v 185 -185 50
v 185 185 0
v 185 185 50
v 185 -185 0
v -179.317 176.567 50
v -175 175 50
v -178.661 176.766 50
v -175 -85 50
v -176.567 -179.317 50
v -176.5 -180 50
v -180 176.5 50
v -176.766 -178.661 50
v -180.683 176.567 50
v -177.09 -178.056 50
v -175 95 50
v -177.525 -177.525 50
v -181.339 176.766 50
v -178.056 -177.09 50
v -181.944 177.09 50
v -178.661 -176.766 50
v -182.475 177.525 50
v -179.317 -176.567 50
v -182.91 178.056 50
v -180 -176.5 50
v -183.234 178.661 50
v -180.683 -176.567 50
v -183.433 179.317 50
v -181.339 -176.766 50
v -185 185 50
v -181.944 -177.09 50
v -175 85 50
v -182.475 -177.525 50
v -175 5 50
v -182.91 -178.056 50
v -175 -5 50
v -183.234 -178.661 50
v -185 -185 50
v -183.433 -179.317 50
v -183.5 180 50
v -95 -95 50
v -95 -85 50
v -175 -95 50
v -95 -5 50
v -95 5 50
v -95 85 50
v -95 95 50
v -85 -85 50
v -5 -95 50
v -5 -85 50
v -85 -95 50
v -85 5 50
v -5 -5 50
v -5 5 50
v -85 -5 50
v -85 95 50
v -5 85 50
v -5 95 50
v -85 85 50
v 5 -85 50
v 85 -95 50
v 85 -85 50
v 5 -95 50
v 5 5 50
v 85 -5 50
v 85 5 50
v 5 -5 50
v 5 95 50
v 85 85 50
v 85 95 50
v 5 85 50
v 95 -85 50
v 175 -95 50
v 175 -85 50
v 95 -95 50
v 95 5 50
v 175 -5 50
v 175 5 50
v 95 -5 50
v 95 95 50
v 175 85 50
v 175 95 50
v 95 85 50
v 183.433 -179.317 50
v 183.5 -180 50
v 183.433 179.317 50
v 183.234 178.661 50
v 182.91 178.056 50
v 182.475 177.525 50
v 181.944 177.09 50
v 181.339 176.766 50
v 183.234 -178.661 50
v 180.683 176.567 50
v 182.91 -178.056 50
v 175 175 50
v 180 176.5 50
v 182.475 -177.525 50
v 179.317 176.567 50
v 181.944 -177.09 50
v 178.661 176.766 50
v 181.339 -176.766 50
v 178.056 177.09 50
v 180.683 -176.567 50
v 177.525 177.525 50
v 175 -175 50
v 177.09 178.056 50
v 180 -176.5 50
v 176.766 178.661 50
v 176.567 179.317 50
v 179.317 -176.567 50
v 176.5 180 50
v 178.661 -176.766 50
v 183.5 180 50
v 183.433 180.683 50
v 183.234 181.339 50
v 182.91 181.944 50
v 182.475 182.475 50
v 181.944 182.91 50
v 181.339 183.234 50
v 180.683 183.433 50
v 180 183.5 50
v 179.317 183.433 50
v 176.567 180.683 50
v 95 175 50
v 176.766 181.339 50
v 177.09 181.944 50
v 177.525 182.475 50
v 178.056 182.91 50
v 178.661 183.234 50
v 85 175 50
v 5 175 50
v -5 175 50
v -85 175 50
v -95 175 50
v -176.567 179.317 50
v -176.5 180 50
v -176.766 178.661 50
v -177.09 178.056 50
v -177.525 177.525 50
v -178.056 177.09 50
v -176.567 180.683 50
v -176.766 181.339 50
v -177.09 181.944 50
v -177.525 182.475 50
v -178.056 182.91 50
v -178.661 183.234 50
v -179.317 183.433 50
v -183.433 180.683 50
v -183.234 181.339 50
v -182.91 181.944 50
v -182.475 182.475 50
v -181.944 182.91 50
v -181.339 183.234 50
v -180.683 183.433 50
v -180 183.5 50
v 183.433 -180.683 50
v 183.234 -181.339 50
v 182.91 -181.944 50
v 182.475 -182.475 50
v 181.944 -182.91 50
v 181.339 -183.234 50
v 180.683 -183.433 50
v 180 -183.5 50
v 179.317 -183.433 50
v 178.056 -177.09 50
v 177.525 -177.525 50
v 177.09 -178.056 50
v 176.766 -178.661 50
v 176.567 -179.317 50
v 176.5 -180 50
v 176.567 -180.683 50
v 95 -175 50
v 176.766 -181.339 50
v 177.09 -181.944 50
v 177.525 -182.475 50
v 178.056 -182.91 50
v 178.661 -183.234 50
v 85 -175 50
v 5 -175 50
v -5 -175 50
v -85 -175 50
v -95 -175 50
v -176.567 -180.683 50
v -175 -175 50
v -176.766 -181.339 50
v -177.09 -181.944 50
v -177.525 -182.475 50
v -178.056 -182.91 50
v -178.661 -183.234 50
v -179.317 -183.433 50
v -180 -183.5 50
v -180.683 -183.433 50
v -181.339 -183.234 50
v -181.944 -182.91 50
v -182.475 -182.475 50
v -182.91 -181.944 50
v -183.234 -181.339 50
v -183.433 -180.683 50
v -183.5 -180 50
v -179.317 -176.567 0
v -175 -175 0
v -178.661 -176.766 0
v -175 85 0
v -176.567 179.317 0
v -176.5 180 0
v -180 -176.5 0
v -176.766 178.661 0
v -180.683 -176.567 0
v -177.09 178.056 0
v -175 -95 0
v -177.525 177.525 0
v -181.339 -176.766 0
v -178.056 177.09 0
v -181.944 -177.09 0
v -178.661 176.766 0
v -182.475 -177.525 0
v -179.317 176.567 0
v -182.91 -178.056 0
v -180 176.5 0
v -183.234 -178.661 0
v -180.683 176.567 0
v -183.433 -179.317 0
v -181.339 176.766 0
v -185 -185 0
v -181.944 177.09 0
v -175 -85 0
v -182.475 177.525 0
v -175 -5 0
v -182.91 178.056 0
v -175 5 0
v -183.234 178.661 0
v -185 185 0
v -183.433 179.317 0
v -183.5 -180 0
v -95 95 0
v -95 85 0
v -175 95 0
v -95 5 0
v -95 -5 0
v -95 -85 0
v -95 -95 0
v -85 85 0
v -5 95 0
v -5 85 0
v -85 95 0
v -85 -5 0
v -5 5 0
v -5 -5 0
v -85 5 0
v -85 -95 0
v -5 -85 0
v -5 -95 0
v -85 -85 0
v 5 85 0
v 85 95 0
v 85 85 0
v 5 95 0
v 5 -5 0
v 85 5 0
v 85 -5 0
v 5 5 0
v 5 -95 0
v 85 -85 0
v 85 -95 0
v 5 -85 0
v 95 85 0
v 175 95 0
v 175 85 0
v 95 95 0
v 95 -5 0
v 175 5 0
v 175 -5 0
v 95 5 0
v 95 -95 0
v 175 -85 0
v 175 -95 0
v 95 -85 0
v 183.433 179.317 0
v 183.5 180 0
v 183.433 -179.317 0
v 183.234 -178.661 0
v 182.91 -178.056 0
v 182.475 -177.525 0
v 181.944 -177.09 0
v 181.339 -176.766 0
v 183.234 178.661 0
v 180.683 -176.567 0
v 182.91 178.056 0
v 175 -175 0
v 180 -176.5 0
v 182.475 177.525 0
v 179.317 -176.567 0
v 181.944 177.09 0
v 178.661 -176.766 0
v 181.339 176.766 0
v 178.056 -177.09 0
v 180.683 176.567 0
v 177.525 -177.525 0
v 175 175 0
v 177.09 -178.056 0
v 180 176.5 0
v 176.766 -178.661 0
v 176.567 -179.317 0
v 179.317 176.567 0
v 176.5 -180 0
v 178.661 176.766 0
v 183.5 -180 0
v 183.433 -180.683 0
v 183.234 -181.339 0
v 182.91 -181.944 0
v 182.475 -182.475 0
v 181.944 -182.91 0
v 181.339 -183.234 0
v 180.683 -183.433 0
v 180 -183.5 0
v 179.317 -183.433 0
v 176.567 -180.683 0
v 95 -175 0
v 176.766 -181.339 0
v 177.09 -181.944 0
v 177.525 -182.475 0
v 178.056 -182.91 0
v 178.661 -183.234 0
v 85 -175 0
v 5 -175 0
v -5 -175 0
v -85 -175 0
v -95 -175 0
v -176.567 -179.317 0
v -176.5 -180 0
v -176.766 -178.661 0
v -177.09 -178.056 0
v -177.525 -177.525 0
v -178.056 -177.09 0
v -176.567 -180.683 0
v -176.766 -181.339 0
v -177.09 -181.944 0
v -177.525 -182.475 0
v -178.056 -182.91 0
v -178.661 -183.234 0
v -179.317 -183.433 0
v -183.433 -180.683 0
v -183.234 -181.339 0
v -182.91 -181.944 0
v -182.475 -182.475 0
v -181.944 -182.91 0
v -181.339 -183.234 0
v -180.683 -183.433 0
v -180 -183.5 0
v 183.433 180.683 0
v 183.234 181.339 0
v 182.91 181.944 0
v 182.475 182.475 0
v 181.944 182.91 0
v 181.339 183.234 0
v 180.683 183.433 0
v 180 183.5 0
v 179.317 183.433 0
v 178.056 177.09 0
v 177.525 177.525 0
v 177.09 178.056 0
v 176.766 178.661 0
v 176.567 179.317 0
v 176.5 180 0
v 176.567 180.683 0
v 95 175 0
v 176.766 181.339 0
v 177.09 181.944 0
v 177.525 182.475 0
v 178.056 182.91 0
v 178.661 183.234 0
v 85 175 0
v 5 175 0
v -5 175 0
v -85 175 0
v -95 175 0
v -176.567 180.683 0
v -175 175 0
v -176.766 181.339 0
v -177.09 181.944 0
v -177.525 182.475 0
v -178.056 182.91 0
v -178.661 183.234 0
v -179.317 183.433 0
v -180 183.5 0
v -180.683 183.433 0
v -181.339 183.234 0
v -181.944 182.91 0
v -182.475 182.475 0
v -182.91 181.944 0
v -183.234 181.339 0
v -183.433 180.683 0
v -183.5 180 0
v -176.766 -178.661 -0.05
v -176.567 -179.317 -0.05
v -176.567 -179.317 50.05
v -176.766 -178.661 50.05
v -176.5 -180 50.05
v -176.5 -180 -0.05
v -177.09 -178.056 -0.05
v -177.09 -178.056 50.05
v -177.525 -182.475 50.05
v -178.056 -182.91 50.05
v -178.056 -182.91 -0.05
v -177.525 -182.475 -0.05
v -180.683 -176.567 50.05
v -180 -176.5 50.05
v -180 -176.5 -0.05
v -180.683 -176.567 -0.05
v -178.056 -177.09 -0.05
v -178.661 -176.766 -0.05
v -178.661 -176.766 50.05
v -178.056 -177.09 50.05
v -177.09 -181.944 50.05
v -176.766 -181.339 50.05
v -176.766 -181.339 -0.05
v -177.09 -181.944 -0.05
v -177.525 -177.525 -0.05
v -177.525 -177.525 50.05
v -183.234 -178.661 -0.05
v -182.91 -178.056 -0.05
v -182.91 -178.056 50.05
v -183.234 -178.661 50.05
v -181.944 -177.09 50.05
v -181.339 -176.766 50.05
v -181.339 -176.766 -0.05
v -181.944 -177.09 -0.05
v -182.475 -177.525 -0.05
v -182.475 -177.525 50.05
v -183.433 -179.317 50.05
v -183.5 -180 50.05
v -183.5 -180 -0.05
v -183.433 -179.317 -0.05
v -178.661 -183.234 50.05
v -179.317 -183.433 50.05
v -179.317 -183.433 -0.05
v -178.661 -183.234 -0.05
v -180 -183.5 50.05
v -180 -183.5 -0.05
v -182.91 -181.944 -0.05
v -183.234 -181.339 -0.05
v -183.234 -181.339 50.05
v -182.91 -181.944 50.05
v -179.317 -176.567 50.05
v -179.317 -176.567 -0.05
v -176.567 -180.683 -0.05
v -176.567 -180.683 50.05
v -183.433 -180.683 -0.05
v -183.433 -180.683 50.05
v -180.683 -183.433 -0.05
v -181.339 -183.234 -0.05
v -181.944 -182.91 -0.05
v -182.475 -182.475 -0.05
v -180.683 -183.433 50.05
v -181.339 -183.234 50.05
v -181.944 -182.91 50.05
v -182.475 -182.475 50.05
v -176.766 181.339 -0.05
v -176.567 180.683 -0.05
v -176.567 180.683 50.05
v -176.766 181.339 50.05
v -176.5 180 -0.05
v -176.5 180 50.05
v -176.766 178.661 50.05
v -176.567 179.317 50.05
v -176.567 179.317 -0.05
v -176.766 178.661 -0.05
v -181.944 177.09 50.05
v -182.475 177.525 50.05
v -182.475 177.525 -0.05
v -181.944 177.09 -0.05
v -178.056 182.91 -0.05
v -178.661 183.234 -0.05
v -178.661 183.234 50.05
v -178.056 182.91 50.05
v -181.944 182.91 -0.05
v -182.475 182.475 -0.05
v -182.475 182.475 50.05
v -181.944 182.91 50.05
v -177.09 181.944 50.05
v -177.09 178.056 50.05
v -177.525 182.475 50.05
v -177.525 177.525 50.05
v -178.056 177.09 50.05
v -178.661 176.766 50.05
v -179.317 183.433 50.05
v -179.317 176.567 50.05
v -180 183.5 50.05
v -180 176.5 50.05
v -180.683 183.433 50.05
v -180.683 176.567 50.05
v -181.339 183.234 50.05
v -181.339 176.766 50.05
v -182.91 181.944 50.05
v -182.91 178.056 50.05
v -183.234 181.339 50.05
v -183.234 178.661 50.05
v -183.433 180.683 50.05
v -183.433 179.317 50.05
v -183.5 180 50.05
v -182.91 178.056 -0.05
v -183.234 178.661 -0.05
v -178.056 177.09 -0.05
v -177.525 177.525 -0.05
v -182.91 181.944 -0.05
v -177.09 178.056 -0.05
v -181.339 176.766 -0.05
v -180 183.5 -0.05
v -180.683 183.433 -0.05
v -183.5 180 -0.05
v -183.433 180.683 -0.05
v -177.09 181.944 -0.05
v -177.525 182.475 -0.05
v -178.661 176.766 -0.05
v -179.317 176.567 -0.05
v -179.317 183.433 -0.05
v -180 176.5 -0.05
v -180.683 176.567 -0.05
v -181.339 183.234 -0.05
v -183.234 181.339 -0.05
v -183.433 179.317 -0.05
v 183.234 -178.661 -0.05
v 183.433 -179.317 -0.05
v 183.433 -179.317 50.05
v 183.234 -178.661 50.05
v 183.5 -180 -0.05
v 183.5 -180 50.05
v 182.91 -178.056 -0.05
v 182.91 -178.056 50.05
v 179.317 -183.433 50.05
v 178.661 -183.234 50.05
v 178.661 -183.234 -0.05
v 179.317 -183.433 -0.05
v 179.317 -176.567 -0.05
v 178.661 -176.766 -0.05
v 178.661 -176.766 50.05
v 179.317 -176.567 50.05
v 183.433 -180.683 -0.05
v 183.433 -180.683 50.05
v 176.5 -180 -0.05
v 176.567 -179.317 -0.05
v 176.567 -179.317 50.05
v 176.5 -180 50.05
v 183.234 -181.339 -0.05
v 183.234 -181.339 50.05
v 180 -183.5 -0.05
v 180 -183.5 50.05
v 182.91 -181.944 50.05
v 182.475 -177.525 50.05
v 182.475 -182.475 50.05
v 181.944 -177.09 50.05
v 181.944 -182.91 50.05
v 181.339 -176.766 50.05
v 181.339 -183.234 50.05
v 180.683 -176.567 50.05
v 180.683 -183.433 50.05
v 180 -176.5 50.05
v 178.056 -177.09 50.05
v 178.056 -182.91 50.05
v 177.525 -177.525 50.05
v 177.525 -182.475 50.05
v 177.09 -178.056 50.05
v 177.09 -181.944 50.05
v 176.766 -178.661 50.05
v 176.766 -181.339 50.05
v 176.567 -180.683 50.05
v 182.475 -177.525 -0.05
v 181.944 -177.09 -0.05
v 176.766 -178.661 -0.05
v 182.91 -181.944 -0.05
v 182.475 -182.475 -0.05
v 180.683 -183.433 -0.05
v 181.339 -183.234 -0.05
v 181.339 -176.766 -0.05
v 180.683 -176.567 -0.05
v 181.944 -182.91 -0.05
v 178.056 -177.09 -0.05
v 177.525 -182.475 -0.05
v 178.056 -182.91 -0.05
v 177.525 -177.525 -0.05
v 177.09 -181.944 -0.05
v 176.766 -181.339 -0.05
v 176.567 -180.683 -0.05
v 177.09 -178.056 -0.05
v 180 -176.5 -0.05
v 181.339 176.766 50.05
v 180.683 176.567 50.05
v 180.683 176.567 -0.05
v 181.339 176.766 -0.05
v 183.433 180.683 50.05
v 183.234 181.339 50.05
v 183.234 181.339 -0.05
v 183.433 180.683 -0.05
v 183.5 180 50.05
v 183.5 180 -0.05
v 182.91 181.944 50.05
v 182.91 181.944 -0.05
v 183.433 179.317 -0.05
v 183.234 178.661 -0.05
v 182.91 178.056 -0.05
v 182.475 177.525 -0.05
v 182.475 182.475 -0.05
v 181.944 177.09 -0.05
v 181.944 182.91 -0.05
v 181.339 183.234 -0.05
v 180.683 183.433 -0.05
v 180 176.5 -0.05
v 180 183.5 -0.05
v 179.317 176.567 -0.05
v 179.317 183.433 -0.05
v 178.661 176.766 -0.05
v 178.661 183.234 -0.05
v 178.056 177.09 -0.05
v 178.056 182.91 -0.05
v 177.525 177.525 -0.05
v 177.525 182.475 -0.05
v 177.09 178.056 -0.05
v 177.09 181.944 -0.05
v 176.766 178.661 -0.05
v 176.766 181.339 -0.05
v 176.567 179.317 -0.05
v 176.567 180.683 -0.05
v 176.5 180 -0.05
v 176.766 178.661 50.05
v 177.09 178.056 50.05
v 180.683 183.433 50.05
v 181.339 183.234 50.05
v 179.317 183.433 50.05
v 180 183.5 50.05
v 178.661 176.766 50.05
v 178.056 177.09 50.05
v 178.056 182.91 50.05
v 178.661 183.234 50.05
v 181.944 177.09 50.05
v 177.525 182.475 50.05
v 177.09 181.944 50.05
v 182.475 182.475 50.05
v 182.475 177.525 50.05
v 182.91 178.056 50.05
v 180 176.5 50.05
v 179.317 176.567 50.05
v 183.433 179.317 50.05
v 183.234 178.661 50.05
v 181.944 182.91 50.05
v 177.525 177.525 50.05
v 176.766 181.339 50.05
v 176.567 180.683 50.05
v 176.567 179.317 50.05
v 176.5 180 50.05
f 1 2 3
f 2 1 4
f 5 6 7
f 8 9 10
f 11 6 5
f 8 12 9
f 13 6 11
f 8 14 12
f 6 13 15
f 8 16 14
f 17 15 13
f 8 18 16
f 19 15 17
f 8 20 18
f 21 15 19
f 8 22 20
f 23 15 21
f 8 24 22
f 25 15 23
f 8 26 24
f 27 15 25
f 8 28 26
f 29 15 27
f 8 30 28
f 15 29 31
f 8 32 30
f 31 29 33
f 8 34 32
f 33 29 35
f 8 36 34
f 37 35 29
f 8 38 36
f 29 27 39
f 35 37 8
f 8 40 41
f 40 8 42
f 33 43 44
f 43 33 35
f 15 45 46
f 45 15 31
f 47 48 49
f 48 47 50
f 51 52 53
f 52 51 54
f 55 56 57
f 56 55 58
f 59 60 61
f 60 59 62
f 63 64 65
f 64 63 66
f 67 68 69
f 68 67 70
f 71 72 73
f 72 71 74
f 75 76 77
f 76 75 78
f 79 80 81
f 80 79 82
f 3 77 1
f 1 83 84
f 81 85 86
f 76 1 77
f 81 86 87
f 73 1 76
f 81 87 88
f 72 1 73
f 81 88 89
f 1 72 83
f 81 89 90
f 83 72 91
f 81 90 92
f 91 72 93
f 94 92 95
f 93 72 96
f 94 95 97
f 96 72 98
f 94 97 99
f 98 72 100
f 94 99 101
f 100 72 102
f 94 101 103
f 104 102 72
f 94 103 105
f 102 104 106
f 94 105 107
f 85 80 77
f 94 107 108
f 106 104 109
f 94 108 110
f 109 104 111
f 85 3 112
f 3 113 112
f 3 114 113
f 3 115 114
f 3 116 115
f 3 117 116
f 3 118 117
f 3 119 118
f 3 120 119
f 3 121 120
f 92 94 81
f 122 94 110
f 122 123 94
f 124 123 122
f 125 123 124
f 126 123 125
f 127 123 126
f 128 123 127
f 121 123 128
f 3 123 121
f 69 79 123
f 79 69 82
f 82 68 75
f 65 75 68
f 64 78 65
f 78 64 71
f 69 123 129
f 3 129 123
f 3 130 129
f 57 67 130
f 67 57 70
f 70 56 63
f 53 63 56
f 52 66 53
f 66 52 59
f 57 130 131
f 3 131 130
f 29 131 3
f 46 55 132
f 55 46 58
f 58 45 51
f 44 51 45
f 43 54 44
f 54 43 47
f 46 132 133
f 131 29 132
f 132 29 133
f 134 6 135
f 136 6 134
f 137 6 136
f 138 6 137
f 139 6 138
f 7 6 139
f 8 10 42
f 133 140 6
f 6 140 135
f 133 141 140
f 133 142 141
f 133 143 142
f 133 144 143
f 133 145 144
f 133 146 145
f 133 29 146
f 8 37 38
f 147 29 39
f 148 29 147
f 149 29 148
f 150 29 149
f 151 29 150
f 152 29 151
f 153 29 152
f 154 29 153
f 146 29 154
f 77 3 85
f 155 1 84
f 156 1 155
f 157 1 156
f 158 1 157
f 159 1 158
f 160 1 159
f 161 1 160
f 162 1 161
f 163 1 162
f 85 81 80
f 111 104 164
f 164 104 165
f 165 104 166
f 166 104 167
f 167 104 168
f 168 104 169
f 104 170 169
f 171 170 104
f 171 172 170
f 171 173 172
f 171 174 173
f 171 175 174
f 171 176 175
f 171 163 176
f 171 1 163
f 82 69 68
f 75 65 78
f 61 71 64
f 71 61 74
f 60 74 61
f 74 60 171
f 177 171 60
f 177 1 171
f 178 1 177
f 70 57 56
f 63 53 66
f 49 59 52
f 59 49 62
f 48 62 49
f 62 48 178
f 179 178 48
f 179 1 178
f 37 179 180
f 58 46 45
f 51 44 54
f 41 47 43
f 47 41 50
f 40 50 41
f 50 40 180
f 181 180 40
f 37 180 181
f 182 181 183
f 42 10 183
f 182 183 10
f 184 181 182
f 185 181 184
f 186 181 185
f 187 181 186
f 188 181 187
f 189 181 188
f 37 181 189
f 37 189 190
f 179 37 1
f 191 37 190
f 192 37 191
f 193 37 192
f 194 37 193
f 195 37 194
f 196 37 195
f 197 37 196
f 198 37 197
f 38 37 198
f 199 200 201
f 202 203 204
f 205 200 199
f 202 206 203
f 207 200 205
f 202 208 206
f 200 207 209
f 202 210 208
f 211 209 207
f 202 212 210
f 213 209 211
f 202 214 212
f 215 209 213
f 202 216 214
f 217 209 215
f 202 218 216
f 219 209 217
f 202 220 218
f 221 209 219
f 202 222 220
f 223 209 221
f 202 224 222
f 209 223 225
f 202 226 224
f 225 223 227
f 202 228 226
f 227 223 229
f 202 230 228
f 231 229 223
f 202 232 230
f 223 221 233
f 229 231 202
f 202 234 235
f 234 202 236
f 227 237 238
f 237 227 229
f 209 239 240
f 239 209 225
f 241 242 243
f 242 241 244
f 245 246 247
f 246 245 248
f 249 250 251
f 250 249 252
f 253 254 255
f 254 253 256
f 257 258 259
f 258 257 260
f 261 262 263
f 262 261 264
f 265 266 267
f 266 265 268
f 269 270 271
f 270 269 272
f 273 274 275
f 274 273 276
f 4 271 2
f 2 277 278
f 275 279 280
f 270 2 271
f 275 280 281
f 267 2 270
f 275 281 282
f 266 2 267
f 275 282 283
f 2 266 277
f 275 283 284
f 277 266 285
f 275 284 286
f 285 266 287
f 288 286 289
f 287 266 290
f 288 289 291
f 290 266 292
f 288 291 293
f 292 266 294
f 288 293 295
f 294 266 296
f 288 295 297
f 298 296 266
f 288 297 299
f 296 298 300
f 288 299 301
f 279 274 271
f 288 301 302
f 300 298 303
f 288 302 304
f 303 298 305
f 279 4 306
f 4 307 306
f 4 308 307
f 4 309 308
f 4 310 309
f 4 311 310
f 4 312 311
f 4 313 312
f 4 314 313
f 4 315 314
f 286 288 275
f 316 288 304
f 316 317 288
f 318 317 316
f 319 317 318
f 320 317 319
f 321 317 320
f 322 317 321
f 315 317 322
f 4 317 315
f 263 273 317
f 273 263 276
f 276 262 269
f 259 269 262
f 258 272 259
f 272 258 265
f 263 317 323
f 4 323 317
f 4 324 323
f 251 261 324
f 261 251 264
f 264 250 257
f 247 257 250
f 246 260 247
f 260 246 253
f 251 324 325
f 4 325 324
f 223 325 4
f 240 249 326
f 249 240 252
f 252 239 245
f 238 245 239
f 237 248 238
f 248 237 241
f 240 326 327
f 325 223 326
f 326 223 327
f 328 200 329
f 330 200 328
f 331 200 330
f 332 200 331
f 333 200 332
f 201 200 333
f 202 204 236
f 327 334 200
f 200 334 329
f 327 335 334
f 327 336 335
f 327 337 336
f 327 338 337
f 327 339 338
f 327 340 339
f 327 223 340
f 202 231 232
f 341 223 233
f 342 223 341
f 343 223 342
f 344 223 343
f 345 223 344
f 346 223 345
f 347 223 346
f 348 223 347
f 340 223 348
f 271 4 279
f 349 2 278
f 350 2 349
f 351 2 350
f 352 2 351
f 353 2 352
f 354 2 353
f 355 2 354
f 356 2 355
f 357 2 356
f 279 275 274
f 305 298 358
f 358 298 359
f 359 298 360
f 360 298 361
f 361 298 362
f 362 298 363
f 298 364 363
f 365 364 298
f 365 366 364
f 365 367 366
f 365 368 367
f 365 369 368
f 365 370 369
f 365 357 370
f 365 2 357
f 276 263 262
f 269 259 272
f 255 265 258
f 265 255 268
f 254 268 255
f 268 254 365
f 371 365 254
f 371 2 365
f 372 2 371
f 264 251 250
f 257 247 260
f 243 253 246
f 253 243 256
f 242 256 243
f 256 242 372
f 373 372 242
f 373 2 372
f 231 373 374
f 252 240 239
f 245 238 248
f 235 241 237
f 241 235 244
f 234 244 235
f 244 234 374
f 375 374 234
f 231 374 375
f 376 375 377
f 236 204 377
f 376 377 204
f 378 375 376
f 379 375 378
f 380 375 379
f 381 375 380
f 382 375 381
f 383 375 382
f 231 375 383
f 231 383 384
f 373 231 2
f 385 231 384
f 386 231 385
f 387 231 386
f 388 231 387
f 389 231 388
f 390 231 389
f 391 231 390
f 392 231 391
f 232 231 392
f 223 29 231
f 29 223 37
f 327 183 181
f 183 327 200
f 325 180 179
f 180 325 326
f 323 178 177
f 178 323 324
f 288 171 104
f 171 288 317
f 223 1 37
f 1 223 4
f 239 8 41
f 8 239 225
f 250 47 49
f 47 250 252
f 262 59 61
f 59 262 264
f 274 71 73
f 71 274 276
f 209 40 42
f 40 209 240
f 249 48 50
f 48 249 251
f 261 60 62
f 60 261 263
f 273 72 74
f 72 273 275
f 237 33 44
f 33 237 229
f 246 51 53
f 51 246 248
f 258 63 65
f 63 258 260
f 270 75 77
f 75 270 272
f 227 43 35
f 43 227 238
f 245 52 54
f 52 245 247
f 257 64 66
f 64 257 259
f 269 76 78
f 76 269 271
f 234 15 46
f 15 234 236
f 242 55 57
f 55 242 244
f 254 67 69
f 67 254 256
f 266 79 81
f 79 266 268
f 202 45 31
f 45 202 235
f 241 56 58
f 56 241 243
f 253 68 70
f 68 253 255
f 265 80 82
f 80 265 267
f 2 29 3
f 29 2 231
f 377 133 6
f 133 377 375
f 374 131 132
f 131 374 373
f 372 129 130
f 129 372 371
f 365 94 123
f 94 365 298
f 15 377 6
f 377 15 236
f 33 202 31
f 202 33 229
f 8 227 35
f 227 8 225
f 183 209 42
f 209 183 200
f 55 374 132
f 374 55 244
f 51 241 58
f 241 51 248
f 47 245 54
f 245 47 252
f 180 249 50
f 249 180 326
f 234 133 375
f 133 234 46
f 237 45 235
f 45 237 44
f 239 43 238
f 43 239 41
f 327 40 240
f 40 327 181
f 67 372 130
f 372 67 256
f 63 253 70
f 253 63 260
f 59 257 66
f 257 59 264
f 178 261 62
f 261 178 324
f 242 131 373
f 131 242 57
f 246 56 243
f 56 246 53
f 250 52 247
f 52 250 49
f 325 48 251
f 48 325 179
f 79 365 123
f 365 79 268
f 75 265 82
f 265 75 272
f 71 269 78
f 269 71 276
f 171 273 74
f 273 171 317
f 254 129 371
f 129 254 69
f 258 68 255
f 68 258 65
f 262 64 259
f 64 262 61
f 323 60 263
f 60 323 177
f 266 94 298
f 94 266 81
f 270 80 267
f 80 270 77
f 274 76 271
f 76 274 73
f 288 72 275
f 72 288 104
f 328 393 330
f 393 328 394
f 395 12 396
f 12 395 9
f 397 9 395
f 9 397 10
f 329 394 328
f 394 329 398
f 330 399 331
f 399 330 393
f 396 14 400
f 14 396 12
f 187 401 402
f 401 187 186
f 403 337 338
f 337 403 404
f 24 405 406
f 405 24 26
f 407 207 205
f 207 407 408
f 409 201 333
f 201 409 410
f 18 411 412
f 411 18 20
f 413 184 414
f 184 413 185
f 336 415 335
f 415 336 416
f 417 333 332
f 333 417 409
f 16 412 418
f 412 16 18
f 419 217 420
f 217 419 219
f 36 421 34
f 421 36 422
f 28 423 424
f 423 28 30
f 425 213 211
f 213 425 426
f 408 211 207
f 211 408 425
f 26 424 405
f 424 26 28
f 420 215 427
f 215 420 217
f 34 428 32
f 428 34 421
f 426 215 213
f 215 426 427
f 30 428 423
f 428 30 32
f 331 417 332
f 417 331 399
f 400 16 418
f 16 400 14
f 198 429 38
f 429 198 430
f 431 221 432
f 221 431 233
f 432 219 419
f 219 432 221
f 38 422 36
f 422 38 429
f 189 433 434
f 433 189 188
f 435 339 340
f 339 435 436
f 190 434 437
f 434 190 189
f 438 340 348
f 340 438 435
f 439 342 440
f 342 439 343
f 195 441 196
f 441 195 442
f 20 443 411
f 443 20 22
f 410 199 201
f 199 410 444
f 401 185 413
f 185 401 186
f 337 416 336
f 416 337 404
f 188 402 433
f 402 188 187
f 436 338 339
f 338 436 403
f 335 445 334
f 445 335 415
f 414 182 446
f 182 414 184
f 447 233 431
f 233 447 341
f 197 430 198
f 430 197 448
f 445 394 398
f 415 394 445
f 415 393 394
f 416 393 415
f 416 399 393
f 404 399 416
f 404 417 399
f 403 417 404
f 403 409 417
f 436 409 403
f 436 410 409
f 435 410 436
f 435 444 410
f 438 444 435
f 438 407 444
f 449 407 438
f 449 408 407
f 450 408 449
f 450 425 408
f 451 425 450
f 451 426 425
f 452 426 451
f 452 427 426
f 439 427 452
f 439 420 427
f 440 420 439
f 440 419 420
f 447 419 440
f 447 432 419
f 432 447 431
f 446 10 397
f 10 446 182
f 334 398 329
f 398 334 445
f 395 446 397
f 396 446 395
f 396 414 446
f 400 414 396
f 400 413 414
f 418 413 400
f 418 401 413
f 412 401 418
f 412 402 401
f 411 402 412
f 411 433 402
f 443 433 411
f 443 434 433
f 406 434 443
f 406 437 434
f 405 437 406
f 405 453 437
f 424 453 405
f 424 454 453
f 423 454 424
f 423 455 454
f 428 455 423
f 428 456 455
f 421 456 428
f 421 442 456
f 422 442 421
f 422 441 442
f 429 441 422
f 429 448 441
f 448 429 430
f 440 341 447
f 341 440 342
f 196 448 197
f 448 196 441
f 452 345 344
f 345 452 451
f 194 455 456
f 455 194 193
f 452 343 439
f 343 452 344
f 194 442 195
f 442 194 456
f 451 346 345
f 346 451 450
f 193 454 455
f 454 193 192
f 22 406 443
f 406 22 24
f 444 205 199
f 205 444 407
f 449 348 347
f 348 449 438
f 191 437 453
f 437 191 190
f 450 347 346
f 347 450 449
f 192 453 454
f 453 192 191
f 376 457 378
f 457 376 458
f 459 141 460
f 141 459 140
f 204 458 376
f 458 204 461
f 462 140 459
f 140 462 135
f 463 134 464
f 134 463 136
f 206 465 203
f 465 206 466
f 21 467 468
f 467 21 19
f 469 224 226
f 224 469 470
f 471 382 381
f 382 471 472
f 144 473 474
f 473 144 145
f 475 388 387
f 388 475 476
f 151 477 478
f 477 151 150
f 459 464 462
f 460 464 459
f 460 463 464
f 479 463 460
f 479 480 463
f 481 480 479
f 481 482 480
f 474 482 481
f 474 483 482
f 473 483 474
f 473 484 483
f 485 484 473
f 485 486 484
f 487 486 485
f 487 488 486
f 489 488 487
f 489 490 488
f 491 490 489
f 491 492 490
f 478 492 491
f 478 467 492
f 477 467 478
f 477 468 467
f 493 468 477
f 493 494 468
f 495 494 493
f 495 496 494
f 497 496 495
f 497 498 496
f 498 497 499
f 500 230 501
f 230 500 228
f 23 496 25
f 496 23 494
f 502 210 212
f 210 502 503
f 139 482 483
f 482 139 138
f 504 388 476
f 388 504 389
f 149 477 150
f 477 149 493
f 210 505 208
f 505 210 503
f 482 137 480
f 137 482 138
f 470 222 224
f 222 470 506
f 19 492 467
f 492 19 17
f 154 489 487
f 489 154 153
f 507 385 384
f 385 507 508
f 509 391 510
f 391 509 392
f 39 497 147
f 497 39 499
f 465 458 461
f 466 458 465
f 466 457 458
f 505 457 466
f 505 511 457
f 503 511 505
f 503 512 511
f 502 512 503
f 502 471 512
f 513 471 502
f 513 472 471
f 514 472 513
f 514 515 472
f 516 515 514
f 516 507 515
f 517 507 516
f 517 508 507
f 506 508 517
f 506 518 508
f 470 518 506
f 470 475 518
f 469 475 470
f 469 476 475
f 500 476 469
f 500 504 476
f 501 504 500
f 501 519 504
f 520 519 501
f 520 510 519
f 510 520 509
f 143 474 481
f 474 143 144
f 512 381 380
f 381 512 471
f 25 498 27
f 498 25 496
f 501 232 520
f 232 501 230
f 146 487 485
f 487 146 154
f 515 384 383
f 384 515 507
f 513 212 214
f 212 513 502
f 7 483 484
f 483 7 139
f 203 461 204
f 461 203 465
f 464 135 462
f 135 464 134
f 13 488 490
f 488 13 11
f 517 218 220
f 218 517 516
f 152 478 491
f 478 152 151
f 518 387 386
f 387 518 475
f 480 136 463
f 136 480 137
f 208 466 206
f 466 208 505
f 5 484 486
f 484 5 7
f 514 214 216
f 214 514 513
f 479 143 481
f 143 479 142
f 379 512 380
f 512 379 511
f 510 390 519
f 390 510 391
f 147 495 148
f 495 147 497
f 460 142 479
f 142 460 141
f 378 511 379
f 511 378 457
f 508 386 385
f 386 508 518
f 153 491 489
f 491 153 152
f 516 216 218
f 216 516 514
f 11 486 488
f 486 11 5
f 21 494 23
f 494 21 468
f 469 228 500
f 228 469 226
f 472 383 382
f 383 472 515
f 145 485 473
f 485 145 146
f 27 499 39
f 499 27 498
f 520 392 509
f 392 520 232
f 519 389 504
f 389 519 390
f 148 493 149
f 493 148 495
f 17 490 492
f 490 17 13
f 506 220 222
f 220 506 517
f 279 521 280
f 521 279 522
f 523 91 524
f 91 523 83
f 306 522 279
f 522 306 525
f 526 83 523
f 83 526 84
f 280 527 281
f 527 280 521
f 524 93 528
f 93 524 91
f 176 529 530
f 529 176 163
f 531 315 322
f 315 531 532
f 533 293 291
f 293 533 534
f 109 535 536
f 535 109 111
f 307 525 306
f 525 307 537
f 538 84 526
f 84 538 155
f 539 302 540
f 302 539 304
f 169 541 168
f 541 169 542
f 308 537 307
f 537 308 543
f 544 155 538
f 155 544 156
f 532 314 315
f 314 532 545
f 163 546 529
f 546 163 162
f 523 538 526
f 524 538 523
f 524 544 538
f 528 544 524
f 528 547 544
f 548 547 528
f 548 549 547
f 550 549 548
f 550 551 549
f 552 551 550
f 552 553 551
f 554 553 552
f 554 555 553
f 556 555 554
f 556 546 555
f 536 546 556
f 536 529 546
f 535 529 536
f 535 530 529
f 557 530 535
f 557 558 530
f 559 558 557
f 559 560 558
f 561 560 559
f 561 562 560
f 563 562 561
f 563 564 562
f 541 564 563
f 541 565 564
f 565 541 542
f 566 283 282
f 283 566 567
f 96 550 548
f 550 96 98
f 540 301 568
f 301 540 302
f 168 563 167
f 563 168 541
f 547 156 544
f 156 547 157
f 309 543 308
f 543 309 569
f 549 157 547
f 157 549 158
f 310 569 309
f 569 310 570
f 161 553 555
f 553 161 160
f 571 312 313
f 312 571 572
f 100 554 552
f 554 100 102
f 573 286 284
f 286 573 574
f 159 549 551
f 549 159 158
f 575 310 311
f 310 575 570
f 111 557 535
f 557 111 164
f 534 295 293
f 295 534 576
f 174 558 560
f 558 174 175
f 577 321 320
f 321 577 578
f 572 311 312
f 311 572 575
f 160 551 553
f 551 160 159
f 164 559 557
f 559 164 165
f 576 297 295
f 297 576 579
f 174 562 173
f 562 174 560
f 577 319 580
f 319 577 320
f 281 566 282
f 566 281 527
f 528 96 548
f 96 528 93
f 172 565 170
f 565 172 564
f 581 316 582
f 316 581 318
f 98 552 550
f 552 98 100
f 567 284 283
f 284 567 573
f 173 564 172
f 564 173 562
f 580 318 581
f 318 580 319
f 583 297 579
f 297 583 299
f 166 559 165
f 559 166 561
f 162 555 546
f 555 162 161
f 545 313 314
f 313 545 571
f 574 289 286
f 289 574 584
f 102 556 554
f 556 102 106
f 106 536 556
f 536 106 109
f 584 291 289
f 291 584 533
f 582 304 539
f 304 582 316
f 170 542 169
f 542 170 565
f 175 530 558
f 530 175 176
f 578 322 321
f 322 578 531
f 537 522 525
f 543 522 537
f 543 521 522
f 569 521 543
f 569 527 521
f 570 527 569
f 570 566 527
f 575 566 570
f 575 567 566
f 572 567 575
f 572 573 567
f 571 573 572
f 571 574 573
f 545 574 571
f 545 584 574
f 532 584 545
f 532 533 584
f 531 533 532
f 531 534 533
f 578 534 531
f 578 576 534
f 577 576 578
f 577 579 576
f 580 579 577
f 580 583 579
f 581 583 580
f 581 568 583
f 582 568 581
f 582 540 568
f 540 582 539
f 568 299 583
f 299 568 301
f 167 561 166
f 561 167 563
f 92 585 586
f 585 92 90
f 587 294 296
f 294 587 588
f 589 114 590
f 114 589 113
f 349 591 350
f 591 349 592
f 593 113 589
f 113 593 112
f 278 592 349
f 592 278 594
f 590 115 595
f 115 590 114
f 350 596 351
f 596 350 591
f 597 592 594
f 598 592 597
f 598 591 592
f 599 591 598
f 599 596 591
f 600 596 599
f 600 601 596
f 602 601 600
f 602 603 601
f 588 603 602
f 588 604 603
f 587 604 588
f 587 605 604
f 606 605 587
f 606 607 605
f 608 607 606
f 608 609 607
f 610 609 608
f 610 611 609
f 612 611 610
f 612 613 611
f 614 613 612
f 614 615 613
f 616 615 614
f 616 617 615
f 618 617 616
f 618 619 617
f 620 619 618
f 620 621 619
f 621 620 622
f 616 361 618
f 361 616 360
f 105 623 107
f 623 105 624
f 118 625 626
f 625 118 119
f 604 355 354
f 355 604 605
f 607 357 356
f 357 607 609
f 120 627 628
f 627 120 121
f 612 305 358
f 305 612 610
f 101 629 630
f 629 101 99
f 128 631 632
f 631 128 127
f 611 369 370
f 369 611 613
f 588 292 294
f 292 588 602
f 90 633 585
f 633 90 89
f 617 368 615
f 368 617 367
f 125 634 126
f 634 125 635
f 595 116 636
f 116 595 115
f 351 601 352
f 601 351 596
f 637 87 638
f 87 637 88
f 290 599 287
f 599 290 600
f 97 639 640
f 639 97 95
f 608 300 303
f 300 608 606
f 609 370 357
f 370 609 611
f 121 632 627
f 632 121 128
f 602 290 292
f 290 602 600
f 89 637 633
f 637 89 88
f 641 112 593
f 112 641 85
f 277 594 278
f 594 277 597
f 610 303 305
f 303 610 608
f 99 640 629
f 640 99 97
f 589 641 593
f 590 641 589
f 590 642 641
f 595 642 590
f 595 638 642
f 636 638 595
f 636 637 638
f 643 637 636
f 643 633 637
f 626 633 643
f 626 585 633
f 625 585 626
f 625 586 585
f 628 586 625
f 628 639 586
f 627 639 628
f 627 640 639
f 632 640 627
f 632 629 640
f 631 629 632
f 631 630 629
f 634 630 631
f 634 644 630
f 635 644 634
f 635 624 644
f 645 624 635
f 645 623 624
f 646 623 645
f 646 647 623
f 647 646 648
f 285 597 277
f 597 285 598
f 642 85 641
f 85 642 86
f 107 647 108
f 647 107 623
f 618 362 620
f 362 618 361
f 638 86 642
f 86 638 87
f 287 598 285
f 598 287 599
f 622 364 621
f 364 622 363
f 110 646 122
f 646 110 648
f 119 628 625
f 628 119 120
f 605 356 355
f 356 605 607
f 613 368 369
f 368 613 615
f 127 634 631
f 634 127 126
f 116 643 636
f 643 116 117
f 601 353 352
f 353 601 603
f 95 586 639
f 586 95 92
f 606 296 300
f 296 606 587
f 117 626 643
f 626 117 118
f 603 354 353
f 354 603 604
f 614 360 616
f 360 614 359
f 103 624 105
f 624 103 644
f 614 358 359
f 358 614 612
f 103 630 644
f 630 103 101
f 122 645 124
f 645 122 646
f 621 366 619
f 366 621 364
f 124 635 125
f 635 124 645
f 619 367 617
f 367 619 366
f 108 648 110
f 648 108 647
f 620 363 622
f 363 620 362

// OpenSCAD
// Part Name: Cage_Layer_11_H50mm
// This part represents a horizontal slice of the cage.
// It is designed to be 3D printed on its base.

// Parameters for the cage
bar_t = 10;
gap_xy = 80;
hole_d = 7;
cage_ext_xy = 370;

// Calculate bar center positions relative to the overall cage center
bar_centers_xy = [for (j = [0:4]) (-cage_ext_xy/2 + bar_t/2 + j * (bar_t + gap_xy))];

// Module to generate a single layer segment
module cage_layer_segment(height) {
    // Offset for printing on z=0 plane. The module itself is centered on XY=0, so this Z offset moves its base to Z=0.
    translate([0, 0, height/2]) {
        union() {
            // Horizontal bars (along X)
            for (y_center = bar_centers_xy) {
                translate([0, y_center, 0])
                cube([cage_ext_xy, bar_t, height], center = true);
            }

            // Vertical bars (along Y)
            for (x_center = bar_centers_xy) {
                translate([x_center, 0, 0])
                cube([bar_t, cage_ext_xy, height], center = true);
            }

            // Subtract holes for M6 rods at the 4 corners
            corner_offsets_xy = [bar_centers_xy[0], bar_centers_xy[4]];

            for (x_offset = corner_offsets_xy) {
                for (y_offset = corner_offsets_xy) {
                    // Hole through the center of the corner bar
                    translate([x_offset, y_offset, 0])
                    cylinder(h = height + 0.1, d = hole_d, center = true, $fn=32); // +0.1 for clean cut
                }
            }
        }
    }
}

// Render the segment
cage_layer_segment(50);
